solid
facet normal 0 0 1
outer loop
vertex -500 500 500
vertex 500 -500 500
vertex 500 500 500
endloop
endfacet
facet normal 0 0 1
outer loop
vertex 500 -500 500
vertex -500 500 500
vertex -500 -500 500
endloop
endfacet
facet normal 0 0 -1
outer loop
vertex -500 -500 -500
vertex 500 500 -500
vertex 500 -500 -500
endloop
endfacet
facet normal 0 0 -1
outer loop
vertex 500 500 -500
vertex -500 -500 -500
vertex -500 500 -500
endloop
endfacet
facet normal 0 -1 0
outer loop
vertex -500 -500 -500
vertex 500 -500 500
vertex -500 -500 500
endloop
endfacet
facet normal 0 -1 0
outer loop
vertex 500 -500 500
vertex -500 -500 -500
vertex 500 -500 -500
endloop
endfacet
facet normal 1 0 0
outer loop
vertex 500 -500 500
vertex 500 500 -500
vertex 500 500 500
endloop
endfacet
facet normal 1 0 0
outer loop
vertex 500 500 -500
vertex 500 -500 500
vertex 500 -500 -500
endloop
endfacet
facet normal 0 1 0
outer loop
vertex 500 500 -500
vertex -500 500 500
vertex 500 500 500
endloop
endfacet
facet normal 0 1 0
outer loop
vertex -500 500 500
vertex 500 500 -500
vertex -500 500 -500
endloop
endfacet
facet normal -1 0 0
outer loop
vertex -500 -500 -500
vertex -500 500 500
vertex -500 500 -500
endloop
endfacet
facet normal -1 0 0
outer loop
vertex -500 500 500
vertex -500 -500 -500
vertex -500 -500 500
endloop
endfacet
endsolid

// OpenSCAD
/*
   Copyright 2015-2020 Scott Bezek and the splitflap contributors

   Licensed under the Apache License, Version 2.0 (the "License");
   you may not use this file except in compliance with the License.
   You may obtain a copy of the License at

       http://www.apache.org/licenses/LICENSE-2.0

   Unless required by applicable law or agreed to in writing, software
   distributed under the License is distributed on an "AS IS" BASIS,
   WITHOUT WARRANTIES OR CONDITIONS OF ANY KIND, either express or implied.
   See the License for the specific language governing permissions and
   limitations under the License.
*/

module legacyAssert(truth, msg="(no messsage provided)") {
    if (!truth) {
        // Intentionally don't close the <div> tag to make the entire console red
        echo(str(
            "<div style='background-color:#FF0000'>",
            "<br><br>",
            "####################",
            "<br><br>",
            "<span style='font-size: x-large'>ASSERTION ERROR!</span>",
            "<br><br>",
            msg,
            "<br><br>",
            "####################",
            "<br><br>"));

         color_extractor("red") {
            cube([1000, 1000, 1000], center=true);
        }
    }
}

required_widgets = 24;
widgets = 12 + 3;

legacyAssert(widgets >= required_widgets, str("Not enough widgets! Required ", required_widgets, " but found ", widgets));



module color_extractor(c) {
    echo(extracted_color=c);
    children();
}
